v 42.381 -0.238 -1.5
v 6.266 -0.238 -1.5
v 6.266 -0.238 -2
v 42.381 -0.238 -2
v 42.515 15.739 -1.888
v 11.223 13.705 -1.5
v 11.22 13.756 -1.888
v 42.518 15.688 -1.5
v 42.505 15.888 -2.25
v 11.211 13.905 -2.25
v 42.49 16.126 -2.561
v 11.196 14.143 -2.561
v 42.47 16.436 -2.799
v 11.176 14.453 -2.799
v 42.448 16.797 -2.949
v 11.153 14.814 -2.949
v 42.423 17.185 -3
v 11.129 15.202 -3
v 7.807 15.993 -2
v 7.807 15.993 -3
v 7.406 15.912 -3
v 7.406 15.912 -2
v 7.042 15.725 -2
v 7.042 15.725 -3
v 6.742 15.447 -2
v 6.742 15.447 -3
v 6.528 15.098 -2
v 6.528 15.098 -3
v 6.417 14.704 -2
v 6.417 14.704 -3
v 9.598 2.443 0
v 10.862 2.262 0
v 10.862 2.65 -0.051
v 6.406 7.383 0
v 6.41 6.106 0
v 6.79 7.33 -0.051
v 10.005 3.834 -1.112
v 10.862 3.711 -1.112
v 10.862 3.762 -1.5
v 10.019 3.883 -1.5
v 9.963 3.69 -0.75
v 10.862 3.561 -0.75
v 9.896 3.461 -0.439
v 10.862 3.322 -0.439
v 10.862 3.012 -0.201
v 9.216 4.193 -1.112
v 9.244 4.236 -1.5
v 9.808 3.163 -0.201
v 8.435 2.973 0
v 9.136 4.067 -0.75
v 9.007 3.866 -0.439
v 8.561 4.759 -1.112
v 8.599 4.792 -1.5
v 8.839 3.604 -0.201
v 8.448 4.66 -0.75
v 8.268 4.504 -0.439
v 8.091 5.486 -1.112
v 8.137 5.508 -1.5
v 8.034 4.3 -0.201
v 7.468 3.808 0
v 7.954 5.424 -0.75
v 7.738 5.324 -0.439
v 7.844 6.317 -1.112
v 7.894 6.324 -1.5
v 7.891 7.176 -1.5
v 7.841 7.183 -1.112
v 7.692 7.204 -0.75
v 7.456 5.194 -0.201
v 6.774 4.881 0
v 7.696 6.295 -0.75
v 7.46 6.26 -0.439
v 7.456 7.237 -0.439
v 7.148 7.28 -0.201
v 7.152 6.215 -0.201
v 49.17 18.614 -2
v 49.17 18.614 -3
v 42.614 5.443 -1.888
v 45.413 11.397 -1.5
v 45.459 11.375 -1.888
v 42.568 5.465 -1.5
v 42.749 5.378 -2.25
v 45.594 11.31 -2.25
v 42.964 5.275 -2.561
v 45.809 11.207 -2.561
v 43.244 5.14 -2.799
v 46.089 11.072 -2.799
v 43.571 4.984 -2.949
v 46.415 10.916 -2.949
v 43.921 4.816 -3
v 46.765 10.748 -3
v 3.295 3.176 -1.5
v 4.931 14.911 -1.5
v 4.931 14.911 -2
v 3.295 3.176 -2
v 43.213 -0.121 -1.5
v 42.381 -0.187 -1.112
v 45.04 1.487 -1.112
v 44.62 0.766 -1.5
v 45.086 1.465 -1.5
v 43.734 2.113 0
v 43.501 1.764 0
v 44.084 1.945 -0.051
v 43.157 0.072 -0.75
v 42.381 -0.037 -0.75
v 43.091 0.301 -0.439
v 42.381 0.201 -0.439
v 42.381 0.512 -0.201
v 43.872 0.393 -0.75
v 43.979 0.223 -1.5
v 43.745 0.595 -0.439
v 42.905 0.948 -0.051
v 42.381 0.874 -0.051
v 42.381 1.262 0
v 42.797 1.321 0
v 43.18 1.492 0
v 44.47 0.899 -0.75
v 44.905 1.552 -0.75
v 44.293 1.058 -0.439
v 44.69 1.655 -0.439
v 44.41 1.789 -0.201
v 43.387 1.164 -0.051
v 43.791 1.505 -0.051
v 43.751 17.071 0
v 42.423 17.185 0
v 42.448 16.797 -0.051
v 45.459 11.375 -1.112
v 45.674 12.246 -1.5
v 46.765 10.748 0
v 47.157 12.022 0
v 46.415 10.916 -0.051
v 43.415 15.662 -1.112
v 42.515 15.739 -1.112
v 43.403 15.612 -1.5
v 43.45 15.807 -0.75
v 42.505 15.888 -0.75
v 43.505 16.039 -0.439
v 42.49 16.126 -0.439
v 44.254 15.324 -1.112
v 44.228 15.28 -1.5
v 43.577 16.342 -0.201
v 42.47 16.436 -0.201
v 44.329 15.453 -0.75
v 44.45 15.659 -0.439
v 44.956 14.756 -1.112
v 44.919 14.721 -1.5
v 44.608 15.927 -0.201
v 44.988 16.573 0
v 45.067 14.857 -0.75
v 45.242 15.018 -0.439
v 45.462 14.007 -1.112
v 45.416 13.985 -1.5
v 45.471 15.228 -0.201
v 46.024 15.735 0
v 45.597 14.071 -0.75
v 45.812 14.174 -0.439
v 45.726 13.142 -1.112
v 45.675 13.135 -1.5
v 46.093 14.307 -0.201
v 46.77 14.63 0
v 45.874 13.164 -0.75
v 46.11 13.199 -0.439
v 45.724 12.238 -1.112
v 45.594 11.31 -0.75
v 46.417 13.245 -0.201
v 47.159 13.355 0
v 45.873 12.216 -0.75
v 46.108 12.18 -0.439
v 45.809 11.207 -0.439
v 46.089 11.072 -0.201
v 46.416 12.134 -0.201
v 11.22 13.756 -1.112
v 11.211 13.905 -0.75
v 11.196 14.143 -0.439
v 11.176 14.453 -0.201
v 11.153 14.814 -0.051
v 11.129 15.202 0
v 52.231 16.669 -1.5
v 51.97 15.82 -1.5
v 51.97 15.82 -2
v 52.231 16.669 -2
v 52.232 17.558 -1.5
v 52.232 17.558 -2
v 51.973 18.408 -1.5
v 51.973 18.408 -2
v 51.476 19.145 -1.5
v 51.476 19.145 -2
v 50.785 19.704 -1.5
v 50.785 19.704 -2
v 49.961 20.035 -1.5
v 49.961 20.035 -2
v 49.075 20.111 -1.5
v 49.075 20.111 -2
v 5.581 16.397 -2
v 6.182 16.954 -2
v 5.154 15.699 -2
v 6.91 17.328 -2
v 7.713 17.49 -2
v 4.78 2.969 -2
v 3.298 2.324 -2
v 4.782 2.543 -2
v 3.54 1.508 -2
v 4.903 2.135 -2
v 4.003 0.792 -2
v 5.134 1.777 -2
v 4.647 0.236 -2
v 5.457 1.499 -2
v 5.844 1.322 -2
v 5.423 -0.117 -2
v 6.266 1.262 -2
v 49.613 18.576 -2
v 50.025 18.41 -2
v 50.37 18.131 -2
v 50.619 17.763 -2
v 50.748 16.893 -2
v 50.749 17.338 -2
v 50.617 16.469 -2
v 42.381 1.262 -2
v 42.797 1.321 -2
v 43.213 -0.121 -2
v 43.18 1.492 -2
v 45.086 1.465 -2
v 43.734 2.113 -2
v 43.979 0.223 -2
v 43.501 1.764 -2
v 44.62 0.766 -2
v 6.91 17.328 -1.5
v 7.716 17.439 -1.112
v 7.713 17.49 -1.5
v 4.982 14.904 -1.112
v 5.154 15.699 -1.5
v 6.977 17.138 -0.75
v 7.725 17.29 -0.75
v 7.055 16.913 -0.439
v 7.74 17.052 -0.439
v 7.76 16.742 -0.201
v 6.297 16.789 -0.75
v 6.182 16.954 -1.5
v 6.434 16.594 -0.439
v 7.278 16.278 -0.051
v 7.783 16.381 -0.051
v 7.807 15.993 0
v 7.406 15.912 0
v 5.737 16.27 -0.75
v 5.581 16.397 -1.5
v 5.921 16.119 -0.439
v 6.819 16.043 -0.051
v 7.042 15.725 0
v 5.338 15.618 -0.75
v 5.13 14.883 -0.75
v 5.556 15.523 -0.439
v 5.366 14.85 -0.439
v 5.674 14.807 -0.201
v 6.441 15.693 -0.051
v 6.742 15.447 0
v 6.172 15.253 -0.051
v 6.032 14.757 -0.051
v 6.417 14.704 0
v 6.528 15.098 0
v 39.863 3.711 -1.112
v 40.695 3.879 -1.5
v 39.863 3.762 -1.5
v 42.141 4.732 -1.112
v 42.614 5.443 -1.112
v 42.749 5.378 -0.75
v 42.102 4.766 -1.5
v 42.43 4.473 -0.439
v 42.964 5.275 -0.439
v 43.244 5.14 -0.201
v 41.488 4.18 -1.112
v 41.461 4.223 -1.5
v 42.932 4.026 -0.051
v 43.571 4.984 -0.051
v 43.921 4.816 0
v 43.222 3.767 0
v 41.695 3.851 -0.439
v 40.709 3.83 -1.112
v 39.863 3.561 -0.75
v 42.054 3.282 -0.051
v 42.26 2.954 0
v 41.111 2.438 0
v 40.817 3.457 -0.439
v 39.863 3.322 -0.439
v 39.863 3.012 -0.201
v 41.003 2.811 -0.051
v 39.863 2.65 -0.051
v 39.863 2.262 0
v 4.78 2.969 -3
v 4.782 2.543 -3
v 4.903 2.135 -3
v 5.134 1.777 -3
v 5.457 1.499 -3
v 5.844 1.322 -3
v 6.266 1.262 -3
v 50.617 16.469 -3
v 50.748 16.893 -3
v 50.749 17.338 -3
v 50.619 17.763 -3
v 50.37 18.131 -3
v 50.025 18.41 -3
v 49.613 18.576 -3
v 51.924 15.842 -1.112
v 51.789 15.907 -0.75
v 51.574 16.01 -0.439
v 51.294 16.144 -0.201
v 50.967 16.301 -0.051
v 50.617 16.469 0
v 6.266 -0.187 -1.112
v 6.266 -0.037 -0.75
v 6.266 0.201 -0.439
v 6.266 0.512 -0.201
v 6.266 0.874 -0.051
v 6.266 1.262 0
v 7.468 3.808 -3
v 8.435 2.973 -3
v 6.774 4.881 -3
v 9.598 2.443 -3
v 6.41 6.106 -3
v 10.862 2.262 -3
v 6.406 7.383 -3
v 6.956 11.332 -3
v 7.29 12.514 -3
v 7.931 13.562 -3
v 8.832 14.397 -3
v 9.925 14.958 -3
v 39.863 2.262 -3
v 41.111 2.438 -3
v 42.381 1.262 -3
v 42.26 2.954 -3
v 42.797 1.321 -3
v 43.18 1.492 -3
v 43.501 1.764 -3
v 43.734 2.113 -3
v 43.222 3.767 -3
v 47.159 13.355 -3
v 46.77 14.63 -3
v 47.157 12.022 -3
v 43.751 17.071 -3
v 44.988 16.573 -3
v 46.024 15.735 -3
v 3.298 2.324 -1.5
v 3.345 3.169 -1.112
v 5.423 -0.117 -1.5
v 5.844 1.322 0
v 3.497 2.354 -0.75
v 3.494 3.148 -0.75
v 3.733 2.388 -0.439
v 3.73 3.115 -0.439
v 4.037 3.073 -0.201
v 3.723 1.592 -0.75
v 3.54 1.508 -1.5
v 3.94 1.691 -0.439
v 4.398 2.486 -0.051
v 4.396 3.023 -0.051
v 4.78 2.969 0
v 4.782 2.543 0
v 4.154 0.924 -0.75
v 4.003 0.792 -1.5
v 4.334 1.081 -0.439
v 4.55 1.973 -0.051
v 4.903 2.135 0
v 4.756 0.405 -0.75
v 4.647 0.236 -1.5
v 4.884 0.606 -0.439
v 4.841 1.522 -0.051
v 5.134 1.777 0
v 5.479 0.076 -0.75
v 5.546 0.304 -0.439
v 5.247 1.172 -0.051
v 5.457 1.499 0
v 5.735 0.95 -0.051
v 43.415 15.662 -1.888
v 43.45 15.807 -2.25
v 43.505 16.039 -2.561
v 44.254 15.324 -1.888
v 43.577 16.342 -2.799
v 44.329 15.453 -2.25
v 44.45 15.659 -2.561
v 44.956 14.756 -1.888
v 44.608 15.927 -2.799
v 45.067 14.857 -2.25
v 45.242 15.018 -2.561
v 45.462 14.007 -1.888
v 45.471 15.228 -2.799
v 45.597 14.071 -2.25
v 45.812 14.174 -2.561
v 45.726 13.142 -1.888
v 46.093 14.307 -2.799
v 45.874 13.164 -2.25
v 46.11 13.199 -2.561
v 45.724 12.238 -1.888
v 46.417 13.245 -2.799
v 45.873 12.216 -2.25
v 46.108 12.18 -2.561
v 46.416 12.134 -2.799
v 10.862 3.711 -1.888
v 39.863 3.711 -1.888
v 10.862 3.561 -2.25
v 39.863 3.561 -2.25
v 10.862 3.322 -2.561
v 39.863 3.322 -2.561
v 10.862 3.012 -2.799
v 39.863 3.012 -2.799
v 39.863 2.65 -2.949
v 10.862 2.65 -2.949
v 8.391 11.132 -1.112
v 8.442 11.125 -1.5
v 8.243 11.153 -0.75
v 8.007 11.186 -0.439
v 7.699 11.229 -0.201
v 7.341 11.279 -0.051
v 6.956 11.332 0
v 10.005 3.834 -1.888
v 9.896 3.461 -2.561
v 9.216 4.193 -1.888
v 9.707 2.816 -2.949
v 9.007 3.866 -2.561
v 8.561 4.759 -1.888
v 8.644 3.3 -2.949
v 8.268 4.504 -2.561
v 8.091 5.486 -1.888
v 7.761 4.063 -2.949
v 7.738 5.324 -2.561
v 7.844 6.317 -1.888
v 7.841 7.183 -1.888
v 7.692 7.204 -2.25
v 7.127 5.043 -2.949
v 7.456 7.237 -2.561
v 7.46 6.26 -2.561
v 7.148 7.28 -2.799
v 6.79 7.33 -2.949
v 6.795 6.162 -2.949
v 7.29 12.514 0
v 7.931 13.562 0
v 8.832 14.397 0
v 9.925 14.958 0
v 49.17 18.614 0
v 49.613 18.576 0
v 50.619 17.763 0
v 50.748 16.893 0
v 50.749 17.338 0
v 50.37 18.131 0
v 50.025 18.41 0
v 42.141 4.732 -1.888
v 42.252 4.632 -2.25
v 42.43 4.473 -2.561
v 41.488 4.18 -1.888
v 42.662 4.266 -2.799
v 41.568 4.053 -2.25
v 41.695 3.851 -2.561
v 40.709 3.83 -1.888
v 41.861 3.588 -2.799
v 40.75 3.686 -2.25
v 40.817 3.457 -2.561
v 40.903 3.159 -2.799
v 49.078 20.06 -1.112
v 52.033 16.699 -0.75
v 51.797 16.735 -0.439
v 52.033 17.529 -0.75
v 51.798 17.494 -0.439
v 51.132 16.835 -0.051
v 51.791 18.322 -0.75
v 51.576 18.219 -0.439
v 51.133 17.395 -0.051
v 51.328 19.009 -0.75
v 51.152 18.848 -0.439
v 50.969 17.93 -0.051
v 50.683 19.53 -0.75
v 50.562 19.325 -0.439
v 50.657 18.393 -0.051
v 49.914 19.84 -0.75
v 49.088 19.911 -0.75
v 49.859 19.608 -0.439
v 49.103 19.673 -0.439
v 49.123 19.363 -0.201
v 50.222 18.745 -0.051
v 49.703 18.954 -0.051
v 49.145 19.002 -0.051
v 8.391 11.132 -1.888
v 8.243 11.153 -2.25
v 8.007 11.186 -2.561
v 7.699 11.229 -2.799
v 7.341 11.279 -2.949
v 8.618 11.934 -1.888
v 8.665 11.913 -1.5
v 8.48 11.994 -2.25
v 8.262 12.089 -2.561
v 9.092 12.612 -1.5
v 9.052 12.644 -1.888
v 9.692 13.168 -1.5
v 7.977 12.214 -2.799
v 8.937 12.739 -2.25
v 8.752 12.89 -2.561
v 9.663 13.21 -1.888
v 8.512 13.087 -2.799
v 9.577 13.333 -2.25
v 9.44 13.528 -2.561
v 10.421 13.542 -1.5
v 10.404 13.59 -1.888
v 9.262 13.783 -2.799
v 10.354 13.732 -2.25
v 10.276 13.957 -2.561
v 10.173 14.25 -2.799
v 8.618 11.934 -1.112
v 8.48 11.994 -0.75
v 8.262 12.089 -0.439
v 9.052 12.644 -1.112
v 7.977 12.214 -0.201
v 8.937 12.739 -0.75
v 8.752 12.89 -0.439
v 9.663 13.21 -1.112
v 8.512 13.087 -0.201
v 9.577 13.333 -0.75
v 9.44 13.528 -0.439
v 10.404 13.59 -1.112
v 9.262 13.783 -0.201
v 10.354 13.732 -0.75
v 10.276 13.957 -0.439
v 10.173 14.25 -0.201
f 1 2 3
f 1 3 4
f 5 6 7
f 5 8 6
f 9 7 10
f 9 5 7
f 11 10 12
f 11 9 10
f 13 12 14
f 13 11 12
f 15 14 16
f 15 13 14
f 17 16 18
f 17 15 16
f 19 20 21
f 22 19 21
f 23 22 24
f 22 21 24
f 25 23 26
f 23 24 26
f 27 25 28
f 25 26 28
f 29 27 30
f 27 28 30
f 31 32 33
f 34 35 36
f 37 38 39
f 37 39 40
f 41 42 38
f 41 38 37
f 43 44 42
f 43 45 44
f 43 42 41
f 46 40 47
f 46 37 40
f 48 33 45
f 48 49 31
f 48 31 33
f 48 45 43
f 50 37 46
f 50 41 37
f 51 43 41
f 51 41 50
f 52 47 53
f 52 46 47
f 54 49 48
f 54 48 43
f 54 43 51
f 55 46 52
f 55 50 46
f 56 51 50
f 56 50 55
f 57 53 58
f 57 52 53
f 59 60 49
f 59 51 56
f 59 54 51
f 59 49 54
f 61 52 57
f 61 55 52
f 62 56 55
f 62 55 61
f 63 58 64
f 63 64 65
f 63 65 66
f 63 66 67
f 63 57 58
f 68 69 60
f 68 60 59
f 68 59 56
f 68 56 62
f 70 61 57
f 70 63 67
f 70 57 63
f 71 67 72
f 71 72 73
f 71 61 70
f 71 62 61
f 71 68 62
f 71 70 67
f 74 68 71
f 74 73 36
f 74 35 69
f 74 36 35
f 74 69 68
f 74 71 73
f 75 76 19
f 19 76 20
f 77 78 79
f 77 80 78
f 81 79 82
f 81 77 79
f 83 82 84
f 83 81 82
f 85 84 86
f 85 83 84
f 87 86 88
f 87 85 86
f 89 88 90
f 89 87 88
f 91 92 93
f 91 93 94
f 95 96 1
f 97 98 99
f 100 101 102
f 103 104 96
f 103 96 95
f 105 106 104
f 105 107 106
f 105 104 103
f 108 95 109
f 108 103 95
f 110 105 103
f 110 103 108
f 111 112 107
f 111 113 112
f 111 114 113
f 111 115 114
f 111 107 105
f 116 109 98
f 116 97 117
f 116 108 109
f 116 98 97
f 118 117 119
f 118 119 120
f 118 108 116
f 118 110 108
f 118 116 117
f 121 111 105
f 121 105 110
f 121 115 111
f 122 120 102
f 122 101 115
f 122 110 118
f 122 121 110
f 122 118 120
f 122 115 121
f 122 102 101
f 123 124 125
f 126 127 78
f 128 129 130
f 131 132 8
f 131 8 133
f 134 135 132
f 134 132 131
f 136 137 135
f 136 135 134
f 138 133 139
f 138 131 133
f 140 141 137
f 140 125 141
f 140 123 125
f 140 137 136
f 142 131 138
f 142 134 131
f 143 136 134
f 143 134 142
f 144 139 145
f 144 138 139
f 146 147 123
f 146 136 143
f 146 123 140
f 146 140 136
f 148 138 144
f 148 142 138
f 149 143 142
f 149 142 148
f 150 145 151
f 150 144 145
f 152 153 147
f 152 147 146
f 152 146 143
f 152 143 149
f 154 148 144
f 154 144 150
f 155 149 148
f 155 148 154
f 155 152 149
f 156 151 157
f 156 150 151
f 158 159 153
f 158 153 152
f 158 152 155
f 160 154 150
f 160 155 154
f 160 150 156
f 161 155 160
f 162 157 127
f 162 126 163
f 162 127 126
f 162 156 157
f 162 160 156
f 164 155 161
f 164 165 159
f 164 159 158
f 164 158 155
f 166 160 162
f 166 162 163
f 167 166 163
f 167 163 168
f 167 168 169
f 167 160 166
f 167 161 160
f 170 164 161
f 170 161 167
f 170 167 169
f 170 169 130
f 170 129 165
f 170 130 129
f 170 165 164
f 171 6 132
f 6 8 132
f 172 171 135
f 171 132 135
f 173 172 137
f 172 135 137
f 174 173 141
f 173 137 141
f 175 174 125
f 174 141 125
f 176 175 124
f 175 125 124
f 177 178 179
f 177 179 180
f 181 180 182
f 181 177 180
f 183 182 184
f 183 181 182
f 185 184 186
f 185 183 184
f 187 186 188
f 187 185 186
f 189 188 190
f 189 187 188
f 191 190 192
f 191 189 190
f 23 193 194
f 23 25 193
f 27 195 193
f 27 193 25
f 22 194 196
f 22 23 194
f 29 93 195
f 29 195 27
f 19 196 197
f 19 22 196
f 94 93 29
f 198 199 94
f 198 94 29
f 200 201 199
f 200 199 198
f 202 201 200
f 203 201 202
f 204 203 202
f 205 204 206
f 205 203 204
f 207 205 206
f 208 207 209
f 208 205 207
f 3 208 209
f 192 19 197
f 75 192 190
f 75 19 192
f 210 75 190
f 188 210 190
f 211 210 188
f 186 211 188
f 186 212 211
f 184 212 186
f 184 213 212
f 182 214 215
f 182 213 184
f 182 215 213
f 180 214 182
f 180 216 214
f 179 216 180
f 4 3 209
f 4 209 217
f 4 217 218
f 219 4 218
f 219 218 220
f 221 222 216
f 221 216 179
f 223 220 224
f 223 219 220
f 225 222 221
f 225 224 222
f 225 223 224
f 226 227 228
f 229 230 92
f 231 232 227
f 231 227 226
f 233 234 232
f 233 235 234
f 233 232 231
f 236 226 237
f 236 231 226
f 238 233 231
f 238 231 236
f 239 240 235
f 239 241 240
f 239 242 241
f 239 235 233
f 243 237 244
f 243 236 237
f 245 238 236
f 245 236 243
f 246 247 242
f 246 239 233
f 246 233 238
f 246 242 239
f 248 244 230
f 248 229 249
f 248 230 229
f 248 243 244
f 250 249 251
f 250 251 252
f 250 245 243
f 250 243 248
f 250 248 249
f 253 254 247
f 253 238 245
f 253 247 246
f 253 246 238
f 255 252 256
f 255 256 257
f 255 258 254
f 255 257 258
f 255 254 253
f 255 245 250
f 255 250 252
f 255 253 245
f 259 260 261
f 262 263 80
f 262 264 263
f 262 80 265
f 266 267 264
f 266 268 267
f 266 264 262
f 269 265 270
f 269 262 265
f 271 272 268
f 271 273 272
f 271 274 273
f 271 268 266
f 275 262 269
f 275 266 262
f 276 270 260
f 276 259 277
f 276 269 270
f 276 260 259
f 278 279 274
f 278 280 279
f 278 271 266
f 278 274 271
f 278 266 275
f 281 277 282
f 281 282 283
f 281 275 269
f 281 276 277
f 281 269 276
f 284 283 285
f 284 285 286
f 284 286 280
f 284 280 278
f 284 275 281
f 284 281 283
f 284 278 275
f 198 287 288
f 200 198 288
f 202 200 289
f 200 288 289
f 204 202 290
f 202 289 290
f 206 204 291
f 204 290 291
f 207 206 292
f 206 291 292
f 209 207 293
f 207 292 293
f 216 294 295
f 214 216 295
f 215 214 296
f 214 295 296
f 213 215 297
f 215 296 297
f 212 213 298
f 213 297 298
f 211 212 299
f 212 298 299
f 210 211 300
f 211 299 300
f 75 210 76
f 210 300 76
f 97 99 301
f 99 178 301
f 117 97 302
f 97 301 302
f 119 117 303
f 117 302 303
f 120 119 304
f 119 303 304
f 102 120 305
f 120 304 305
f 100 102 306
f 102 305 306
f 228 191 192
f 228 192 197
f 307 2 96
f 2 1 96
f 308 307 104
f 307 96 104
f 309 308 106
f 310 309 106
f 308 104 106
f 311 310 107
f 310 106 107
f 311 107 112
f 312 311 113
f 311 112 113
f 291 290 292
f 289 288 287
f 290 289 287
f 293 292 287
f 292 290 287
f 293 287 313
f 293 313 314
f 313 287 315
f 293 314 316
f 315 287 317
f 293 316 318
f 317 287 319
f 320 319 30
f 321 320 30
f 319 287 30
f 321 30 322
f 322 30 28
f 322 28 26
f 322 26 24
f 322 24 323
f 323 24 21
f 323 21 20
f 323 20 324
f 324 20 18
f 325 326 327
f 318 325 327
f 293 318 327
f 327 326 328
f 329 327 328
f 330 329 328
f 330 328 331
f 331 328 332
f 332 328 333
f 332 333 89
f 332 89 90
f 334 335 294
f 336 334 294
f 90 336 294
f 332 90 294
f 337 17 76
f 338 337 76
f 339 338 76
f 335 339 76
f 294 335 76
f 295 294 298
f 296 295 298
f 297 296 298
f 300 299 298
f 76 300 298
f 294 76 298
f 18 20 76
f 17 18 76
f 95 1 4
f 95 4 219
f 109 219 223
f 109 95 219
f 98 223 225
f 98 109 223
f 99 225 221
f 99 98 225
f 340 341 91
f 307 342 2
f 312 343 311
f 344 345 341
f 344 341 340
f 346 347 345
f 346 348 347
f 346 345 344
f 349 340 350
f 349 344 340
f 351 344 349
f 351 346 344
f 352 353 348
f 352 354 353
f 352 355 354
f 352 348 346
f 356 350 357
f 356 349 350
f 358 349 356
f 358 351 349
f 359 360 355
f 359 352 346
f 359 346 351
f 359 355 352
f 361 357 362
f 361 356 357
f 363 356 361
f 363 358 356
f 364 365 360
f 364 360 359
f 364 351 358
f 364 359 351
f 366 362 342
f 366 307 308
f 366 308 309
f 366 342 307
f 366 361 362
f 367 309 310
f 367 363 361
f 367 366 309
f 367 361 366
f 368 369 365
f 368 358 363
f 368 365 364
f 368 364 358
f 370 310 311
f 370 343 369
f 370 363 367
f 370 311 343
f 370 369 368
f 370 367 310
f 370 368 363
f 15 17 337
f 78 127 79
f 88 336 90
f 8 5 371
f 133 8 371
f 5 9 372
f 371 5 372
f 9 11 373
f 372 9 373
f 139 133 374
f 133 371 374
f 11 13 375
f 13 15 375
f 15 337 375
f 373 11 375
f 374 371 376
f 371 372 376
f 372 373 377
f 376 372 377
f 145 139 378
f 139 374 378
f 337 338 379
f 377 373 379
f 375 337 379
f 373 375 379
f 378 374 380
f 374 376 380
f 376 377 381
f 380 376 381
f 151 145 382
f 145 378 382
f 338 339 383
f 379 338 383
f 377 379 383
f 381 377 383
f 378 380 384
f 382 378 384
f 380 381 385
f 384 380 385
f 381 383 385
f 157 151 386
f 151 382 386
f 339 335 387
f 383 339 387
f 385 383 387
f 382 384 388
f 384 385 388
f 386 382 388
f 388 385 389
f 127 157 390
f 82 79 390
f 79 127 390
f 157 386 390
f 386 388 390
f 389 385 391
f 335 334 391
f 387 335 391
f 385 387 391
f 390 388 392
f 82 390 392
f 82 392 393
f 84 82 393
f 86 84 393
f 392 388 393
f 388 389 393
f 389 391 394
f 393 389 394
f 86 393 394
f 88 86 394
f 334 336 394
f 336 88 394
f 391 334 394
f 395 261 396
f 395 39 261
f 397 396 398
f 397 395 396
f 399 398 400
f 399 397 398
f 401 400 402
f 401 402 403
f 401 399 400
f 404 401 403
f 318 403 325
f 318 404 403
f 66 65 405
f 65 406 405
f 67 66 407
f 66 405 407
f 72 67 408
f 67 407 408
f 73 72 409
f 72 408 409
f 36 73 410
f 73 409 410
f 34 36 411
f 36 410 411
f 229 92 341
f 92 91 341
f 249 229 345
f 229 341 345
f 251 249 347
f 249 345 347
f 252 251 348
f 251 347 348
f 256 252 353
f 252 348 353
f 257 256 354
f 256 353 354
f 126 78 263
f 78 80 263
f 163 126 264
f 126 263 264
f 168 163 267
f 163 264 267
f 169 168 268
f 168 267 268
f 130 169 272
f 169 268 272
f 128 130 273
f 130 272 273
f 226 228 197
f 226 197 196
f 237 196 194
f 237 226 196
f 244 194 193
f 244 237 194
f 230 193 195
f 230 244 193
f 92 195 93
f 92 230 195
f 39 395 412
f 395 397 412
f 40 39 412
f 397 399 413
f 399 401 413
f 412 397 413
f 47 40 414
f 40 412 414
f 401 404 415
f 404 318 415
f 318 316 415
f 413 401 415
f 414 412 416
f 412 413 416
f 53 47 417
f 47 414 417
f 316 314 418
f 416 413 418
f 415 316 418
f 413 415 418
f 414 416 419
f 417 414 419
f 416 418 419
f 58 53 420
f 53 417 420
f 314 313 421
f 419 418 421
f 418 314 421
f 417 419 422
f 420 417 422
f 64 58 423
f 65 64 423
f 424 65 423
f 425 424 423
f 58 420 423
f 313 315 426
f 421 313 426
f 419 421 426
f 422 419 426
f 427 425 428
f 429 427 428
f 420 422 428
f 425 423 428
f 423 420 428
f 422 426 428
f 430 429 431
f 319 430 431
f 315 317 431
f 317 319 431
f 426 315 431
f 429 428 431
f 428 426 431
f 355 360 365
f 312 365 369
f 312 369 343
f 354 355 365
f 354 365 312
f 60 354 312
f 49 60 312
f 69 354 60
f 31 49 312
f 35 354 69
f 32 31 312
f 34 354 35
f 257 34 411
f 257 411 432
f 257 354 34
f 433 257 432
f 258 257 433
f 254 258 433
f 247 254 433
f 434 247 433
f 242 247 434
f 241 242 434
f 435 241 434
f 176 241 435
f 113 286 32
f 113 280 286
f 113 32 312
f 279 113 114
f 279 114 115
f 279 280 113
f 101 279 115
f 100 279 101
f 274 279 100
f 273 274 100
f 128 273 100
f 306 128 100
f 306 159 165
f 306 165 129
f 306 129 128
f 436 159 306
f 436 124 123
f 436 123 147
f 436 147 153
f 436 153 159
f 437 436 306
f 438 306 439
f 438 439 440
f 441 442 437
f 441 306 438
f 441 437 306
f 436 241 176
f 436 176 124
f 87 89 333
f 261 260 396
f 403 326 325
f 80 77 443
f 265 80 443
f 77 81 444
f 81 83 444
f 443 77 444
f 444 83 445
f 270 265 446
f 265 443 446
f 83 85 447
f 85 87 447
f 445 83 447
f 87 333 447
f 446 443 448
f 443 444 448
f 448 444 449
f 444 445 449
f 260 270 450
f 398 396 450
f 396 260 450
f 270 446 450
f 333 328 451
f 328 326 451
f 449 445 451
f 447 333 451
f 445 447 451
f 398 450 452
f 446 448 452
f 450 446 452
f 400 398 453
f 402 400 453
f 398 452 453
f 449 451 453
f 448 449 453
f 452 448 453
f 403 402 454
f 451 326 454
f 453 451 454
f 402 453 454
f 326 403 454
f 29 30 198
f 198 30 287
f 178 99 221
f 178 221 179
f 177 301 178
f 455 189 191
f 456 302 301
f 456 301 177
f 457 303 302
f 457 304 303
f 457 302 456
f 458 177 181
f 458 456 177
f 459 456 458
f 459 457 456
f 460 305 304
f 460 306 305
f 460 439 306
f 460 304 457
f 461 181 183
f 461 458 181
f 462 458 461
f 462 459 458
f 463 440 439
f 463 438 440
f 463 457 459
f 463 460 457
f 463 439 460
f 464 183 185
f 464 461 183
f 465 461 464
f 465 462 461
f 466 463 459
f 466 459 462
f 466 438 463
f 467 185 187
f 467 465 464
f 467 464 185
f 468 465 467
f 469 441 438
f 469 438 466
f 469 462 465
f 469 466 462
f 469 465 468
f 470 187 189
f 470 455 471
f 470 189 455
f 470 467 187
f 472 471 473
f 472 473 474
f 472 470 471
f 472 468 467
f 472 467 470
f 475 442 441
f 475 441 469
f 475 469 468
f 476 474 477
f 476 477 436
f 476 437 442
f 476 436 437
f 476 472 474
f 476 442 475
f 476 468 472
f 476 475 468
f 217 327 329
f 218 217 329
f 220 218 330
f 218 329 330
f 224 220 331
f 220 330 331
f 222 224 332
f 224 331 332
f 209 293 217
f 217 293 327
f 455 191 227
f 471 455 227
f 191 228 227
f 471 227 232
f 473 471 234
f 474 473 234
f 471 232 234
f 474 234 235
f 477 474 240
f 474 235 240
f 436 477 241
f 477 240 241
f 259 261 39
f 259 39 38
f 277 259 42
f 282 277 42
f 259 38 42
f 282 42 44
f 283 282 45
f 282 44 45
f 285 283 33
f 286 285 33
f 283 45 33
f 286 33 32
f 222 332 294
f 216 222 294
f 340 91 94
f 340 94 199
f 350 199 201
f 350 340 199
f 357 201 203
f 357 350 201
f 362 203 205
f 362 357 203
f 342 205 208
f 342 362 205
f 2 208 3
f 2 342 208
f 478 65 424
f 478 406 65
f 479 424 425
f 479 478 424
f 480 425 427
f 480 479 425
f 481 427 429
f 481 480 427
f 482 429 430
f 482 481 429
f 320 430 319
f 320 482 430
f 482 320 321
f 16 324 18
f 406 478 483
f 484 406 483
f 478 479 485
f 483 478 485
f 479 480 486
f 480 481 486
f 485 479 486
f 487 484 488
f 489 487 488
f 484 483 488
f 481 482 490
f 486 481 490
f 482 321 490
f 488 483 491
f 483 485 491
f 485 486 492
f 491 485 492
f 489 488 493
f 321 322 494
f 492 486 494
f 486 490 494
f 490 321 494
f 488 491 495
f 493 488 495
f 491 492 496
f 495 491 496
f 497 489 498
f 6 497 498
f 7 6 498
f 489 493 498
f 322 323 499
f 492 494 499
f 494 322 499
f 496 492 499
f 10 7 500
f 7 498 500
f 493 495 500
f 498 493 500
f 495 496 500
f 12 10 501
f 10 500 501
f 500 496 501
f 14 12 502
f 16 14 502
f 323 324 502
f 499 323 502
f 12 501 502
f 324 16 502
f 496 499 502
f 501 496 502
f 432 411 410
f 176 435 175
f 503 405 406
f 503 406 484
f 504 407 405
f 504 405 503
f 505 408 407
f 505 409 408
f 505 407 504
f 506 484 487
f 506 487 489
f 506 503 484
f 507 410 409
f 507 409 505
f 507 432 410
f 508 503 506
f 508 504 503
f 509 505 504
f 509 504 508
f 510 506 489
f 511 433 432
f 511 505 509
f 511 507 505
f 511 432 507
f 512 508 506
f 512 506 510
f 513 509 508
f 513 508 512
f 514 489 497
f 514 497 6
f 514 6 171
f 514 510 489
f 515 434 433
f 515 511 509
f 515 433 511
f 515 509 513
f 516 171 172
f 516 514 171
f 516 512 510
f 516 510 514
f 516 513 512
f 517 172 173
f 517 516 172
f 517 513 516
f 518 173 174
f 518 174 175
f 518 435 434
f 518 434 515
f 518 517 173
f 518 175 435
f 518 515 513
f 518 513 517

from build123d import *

# Parameters (mm, degrees)
F1_DEPTH = 3
F2_R     = 1.49999
F5_DEPTH = 1


# Not quite as in the source:
# - a fillet or chamfer is up to 0.001 mm smaller than in the source, because OpenCascade refuses the exact size
# - a feature names something its author has since deleted; it is built from what else it names


with BuildPart() as f1:
    # F0 (on Top) → F1 (new body)
    with BuildSketch(Plane.XY):
        with BuildLine():
            ThreePointArc((7.7126204308, 17.4904861667), (5.8623387123, 16.6961416403), (4.9310753592, 14.9108477622))
            Line((4.9310753592, 14.9108477622), (3.2946010031, 3.1761362209))
            ThreePointArc((3.2946010031, 3.1761362209), (4.002766576, 0.7923969722), (6.265847815, -0.2382215753))
            Line((6.265847815, -0.2382215753), (42.381050937, -0.2382215753))
            ThreePointArc((42.381050937, -0.2382215753), (43.9792635765, 0.2229368859), (45.0861233616, 1.4646341854))
            Line((45.0861233616, 1.4646341854), (51.9699000588, 15.820103651))
            ThreePointArc((51.9699000588, 15.820103651), (51.7518427103, 18.7949713512), (49.0751258939, 20.1112440911))
            Line((49.0751258939, 20.1112440911), (7.7126204308, 17.4904861667))
        make_face()
        with BuildLine():
            Line((39.8630322028, 3.7617784247), (10.8623798602, 3.7617784247))
            ThreePointArc((10.8623798602, 3.7617784247), (8.5992986212, 4.7923969722), (7.8911330484, 7.1761362209))
            Line((7.8911330484, 7.1761362209), (8.4418632915, 11.125272678))
            ThreePointArc((8.4418632915, 11.125272678), (9.3731266446, 12.9105665561), (11.2234083631, 13.7049110825))
            Line((11.2234083631, 13.7049110825), (42.5178482436, 15.6877491719))
            ThreePointArc((42.5178482436, 15.6877491719), (45.19456506, 14.3714764321), (45.4126224085, 11.3966087319))
            Line((45.4126224085, 11.3966087319), (42.5681046274, 5.4646341854))
            ThreePointArc((42.5681046274, 5.4646341854), (41.4612448422, 4.2229368859), (39.8630322028, 3.7617784247))
        make_face(mode=Mode.SUBTRACT)
    extrude(amount=-F1_DEPTH)

    # F2 (radius 1.5 in the source; OpenCascade refuses exactly that, so slightly less here)
    f2_edges = [f1.edges().sort_by_distance(p)[0] for p in [
        (24.323449, -0.238222, 0),
        (48.528012, 8.642369, 0),
        (28.393873, 18.800865, 0),
        (4.112838, 9.043492, 0),
        (25.362706, 3.761778, 0),
        (8.166498, 9.150704, 0),
        (43.990364, 8.430621, 0),
        (26.870628, 14.69633, 0),
        (8.166498, 9.150704, -3),
        (25.362706, 3.761778, -3),
        (26.870628, 14.69633, -3),
        (43.990364, 8.430621, -3),
    ]]
    fillet(f2_edges, radius=F2_R)

    # F4 (on offset) → F5 (cut)
    with BuildSketch(Plane(origin=(0, 0, -3), x_dir=(1, 0, 0), z_dir=(0, 0, -1))):
        with BuildLine():
            Line((3.2946010031, -3.1761362209), (4.9310753592, -14.9108477622))
            ThreePointArc((4.9310753592, -14.9108477622), (5.8623387123, -16.6961416403), (7.7126204308, -17.4904861667))
            Line((7.7126204308, -17.4904861667), (49.0751258939, -20.1112440911))
            ThreePointArc((49.0751258939, -20.1112440911), (51.7518427103, -18.7949713512), (51.9699000588, -15.820103651))
            Line((51.9699000588, -15.820103651), (45.0861233616, -1.4646341854))
            ThreePointArc((45.0861233616, -1.4646341854), (43.9792635765, -0.2229368859), (42.381050937, 0.2382215753))
            Line((42.381050937, 0.2382215753), (6.265847815, 0.2382215753))
            ThreePointArc((6.265847815, 0.2382215753), (4.002766576, -0.7923969722), (3.2946010031, -3.1761362209))
        make_face()
        with BuildLine():
            ThreePointArc((50.6173638465, -16.4686757707), (50.5083351723, -17.9561096208), (49.1699767641, -18.6142459907))
            Line((49.1699767641, -18.6142459907), (7.8074713009, -15.9934880663))
            ThreePointArc((7.8074713009, -15.9934880663), (6.8823304417, -15.5963158031), (6.4166987651, -14.7036688641))
            Line((6.4166987651, -14.7036688641), (4.7802244091, -2.9689573228))
            ThreePointArc((4.7802244091, -2.9689573228), (5.1343071955, -1.7770876984), (6.265847815, -1.2617784247))
            Line((6.265847815, -1.2617784247), (42.381050937, -1.2617784247))
            ThreePointArc((42.381050937, -1.2617784247), (43.1801572567, -1.4923576553), (43.7335871493, -2.113206305))
            Line((43.7335871493, -2.113206305), (50.6173638465, -16.4686757707))
        make_face(mode=Mode.SUBTRACT)
    extrude(amount=-F5_DEPTH, mode=Mode.SUBTRACT)


solid = f1.part
